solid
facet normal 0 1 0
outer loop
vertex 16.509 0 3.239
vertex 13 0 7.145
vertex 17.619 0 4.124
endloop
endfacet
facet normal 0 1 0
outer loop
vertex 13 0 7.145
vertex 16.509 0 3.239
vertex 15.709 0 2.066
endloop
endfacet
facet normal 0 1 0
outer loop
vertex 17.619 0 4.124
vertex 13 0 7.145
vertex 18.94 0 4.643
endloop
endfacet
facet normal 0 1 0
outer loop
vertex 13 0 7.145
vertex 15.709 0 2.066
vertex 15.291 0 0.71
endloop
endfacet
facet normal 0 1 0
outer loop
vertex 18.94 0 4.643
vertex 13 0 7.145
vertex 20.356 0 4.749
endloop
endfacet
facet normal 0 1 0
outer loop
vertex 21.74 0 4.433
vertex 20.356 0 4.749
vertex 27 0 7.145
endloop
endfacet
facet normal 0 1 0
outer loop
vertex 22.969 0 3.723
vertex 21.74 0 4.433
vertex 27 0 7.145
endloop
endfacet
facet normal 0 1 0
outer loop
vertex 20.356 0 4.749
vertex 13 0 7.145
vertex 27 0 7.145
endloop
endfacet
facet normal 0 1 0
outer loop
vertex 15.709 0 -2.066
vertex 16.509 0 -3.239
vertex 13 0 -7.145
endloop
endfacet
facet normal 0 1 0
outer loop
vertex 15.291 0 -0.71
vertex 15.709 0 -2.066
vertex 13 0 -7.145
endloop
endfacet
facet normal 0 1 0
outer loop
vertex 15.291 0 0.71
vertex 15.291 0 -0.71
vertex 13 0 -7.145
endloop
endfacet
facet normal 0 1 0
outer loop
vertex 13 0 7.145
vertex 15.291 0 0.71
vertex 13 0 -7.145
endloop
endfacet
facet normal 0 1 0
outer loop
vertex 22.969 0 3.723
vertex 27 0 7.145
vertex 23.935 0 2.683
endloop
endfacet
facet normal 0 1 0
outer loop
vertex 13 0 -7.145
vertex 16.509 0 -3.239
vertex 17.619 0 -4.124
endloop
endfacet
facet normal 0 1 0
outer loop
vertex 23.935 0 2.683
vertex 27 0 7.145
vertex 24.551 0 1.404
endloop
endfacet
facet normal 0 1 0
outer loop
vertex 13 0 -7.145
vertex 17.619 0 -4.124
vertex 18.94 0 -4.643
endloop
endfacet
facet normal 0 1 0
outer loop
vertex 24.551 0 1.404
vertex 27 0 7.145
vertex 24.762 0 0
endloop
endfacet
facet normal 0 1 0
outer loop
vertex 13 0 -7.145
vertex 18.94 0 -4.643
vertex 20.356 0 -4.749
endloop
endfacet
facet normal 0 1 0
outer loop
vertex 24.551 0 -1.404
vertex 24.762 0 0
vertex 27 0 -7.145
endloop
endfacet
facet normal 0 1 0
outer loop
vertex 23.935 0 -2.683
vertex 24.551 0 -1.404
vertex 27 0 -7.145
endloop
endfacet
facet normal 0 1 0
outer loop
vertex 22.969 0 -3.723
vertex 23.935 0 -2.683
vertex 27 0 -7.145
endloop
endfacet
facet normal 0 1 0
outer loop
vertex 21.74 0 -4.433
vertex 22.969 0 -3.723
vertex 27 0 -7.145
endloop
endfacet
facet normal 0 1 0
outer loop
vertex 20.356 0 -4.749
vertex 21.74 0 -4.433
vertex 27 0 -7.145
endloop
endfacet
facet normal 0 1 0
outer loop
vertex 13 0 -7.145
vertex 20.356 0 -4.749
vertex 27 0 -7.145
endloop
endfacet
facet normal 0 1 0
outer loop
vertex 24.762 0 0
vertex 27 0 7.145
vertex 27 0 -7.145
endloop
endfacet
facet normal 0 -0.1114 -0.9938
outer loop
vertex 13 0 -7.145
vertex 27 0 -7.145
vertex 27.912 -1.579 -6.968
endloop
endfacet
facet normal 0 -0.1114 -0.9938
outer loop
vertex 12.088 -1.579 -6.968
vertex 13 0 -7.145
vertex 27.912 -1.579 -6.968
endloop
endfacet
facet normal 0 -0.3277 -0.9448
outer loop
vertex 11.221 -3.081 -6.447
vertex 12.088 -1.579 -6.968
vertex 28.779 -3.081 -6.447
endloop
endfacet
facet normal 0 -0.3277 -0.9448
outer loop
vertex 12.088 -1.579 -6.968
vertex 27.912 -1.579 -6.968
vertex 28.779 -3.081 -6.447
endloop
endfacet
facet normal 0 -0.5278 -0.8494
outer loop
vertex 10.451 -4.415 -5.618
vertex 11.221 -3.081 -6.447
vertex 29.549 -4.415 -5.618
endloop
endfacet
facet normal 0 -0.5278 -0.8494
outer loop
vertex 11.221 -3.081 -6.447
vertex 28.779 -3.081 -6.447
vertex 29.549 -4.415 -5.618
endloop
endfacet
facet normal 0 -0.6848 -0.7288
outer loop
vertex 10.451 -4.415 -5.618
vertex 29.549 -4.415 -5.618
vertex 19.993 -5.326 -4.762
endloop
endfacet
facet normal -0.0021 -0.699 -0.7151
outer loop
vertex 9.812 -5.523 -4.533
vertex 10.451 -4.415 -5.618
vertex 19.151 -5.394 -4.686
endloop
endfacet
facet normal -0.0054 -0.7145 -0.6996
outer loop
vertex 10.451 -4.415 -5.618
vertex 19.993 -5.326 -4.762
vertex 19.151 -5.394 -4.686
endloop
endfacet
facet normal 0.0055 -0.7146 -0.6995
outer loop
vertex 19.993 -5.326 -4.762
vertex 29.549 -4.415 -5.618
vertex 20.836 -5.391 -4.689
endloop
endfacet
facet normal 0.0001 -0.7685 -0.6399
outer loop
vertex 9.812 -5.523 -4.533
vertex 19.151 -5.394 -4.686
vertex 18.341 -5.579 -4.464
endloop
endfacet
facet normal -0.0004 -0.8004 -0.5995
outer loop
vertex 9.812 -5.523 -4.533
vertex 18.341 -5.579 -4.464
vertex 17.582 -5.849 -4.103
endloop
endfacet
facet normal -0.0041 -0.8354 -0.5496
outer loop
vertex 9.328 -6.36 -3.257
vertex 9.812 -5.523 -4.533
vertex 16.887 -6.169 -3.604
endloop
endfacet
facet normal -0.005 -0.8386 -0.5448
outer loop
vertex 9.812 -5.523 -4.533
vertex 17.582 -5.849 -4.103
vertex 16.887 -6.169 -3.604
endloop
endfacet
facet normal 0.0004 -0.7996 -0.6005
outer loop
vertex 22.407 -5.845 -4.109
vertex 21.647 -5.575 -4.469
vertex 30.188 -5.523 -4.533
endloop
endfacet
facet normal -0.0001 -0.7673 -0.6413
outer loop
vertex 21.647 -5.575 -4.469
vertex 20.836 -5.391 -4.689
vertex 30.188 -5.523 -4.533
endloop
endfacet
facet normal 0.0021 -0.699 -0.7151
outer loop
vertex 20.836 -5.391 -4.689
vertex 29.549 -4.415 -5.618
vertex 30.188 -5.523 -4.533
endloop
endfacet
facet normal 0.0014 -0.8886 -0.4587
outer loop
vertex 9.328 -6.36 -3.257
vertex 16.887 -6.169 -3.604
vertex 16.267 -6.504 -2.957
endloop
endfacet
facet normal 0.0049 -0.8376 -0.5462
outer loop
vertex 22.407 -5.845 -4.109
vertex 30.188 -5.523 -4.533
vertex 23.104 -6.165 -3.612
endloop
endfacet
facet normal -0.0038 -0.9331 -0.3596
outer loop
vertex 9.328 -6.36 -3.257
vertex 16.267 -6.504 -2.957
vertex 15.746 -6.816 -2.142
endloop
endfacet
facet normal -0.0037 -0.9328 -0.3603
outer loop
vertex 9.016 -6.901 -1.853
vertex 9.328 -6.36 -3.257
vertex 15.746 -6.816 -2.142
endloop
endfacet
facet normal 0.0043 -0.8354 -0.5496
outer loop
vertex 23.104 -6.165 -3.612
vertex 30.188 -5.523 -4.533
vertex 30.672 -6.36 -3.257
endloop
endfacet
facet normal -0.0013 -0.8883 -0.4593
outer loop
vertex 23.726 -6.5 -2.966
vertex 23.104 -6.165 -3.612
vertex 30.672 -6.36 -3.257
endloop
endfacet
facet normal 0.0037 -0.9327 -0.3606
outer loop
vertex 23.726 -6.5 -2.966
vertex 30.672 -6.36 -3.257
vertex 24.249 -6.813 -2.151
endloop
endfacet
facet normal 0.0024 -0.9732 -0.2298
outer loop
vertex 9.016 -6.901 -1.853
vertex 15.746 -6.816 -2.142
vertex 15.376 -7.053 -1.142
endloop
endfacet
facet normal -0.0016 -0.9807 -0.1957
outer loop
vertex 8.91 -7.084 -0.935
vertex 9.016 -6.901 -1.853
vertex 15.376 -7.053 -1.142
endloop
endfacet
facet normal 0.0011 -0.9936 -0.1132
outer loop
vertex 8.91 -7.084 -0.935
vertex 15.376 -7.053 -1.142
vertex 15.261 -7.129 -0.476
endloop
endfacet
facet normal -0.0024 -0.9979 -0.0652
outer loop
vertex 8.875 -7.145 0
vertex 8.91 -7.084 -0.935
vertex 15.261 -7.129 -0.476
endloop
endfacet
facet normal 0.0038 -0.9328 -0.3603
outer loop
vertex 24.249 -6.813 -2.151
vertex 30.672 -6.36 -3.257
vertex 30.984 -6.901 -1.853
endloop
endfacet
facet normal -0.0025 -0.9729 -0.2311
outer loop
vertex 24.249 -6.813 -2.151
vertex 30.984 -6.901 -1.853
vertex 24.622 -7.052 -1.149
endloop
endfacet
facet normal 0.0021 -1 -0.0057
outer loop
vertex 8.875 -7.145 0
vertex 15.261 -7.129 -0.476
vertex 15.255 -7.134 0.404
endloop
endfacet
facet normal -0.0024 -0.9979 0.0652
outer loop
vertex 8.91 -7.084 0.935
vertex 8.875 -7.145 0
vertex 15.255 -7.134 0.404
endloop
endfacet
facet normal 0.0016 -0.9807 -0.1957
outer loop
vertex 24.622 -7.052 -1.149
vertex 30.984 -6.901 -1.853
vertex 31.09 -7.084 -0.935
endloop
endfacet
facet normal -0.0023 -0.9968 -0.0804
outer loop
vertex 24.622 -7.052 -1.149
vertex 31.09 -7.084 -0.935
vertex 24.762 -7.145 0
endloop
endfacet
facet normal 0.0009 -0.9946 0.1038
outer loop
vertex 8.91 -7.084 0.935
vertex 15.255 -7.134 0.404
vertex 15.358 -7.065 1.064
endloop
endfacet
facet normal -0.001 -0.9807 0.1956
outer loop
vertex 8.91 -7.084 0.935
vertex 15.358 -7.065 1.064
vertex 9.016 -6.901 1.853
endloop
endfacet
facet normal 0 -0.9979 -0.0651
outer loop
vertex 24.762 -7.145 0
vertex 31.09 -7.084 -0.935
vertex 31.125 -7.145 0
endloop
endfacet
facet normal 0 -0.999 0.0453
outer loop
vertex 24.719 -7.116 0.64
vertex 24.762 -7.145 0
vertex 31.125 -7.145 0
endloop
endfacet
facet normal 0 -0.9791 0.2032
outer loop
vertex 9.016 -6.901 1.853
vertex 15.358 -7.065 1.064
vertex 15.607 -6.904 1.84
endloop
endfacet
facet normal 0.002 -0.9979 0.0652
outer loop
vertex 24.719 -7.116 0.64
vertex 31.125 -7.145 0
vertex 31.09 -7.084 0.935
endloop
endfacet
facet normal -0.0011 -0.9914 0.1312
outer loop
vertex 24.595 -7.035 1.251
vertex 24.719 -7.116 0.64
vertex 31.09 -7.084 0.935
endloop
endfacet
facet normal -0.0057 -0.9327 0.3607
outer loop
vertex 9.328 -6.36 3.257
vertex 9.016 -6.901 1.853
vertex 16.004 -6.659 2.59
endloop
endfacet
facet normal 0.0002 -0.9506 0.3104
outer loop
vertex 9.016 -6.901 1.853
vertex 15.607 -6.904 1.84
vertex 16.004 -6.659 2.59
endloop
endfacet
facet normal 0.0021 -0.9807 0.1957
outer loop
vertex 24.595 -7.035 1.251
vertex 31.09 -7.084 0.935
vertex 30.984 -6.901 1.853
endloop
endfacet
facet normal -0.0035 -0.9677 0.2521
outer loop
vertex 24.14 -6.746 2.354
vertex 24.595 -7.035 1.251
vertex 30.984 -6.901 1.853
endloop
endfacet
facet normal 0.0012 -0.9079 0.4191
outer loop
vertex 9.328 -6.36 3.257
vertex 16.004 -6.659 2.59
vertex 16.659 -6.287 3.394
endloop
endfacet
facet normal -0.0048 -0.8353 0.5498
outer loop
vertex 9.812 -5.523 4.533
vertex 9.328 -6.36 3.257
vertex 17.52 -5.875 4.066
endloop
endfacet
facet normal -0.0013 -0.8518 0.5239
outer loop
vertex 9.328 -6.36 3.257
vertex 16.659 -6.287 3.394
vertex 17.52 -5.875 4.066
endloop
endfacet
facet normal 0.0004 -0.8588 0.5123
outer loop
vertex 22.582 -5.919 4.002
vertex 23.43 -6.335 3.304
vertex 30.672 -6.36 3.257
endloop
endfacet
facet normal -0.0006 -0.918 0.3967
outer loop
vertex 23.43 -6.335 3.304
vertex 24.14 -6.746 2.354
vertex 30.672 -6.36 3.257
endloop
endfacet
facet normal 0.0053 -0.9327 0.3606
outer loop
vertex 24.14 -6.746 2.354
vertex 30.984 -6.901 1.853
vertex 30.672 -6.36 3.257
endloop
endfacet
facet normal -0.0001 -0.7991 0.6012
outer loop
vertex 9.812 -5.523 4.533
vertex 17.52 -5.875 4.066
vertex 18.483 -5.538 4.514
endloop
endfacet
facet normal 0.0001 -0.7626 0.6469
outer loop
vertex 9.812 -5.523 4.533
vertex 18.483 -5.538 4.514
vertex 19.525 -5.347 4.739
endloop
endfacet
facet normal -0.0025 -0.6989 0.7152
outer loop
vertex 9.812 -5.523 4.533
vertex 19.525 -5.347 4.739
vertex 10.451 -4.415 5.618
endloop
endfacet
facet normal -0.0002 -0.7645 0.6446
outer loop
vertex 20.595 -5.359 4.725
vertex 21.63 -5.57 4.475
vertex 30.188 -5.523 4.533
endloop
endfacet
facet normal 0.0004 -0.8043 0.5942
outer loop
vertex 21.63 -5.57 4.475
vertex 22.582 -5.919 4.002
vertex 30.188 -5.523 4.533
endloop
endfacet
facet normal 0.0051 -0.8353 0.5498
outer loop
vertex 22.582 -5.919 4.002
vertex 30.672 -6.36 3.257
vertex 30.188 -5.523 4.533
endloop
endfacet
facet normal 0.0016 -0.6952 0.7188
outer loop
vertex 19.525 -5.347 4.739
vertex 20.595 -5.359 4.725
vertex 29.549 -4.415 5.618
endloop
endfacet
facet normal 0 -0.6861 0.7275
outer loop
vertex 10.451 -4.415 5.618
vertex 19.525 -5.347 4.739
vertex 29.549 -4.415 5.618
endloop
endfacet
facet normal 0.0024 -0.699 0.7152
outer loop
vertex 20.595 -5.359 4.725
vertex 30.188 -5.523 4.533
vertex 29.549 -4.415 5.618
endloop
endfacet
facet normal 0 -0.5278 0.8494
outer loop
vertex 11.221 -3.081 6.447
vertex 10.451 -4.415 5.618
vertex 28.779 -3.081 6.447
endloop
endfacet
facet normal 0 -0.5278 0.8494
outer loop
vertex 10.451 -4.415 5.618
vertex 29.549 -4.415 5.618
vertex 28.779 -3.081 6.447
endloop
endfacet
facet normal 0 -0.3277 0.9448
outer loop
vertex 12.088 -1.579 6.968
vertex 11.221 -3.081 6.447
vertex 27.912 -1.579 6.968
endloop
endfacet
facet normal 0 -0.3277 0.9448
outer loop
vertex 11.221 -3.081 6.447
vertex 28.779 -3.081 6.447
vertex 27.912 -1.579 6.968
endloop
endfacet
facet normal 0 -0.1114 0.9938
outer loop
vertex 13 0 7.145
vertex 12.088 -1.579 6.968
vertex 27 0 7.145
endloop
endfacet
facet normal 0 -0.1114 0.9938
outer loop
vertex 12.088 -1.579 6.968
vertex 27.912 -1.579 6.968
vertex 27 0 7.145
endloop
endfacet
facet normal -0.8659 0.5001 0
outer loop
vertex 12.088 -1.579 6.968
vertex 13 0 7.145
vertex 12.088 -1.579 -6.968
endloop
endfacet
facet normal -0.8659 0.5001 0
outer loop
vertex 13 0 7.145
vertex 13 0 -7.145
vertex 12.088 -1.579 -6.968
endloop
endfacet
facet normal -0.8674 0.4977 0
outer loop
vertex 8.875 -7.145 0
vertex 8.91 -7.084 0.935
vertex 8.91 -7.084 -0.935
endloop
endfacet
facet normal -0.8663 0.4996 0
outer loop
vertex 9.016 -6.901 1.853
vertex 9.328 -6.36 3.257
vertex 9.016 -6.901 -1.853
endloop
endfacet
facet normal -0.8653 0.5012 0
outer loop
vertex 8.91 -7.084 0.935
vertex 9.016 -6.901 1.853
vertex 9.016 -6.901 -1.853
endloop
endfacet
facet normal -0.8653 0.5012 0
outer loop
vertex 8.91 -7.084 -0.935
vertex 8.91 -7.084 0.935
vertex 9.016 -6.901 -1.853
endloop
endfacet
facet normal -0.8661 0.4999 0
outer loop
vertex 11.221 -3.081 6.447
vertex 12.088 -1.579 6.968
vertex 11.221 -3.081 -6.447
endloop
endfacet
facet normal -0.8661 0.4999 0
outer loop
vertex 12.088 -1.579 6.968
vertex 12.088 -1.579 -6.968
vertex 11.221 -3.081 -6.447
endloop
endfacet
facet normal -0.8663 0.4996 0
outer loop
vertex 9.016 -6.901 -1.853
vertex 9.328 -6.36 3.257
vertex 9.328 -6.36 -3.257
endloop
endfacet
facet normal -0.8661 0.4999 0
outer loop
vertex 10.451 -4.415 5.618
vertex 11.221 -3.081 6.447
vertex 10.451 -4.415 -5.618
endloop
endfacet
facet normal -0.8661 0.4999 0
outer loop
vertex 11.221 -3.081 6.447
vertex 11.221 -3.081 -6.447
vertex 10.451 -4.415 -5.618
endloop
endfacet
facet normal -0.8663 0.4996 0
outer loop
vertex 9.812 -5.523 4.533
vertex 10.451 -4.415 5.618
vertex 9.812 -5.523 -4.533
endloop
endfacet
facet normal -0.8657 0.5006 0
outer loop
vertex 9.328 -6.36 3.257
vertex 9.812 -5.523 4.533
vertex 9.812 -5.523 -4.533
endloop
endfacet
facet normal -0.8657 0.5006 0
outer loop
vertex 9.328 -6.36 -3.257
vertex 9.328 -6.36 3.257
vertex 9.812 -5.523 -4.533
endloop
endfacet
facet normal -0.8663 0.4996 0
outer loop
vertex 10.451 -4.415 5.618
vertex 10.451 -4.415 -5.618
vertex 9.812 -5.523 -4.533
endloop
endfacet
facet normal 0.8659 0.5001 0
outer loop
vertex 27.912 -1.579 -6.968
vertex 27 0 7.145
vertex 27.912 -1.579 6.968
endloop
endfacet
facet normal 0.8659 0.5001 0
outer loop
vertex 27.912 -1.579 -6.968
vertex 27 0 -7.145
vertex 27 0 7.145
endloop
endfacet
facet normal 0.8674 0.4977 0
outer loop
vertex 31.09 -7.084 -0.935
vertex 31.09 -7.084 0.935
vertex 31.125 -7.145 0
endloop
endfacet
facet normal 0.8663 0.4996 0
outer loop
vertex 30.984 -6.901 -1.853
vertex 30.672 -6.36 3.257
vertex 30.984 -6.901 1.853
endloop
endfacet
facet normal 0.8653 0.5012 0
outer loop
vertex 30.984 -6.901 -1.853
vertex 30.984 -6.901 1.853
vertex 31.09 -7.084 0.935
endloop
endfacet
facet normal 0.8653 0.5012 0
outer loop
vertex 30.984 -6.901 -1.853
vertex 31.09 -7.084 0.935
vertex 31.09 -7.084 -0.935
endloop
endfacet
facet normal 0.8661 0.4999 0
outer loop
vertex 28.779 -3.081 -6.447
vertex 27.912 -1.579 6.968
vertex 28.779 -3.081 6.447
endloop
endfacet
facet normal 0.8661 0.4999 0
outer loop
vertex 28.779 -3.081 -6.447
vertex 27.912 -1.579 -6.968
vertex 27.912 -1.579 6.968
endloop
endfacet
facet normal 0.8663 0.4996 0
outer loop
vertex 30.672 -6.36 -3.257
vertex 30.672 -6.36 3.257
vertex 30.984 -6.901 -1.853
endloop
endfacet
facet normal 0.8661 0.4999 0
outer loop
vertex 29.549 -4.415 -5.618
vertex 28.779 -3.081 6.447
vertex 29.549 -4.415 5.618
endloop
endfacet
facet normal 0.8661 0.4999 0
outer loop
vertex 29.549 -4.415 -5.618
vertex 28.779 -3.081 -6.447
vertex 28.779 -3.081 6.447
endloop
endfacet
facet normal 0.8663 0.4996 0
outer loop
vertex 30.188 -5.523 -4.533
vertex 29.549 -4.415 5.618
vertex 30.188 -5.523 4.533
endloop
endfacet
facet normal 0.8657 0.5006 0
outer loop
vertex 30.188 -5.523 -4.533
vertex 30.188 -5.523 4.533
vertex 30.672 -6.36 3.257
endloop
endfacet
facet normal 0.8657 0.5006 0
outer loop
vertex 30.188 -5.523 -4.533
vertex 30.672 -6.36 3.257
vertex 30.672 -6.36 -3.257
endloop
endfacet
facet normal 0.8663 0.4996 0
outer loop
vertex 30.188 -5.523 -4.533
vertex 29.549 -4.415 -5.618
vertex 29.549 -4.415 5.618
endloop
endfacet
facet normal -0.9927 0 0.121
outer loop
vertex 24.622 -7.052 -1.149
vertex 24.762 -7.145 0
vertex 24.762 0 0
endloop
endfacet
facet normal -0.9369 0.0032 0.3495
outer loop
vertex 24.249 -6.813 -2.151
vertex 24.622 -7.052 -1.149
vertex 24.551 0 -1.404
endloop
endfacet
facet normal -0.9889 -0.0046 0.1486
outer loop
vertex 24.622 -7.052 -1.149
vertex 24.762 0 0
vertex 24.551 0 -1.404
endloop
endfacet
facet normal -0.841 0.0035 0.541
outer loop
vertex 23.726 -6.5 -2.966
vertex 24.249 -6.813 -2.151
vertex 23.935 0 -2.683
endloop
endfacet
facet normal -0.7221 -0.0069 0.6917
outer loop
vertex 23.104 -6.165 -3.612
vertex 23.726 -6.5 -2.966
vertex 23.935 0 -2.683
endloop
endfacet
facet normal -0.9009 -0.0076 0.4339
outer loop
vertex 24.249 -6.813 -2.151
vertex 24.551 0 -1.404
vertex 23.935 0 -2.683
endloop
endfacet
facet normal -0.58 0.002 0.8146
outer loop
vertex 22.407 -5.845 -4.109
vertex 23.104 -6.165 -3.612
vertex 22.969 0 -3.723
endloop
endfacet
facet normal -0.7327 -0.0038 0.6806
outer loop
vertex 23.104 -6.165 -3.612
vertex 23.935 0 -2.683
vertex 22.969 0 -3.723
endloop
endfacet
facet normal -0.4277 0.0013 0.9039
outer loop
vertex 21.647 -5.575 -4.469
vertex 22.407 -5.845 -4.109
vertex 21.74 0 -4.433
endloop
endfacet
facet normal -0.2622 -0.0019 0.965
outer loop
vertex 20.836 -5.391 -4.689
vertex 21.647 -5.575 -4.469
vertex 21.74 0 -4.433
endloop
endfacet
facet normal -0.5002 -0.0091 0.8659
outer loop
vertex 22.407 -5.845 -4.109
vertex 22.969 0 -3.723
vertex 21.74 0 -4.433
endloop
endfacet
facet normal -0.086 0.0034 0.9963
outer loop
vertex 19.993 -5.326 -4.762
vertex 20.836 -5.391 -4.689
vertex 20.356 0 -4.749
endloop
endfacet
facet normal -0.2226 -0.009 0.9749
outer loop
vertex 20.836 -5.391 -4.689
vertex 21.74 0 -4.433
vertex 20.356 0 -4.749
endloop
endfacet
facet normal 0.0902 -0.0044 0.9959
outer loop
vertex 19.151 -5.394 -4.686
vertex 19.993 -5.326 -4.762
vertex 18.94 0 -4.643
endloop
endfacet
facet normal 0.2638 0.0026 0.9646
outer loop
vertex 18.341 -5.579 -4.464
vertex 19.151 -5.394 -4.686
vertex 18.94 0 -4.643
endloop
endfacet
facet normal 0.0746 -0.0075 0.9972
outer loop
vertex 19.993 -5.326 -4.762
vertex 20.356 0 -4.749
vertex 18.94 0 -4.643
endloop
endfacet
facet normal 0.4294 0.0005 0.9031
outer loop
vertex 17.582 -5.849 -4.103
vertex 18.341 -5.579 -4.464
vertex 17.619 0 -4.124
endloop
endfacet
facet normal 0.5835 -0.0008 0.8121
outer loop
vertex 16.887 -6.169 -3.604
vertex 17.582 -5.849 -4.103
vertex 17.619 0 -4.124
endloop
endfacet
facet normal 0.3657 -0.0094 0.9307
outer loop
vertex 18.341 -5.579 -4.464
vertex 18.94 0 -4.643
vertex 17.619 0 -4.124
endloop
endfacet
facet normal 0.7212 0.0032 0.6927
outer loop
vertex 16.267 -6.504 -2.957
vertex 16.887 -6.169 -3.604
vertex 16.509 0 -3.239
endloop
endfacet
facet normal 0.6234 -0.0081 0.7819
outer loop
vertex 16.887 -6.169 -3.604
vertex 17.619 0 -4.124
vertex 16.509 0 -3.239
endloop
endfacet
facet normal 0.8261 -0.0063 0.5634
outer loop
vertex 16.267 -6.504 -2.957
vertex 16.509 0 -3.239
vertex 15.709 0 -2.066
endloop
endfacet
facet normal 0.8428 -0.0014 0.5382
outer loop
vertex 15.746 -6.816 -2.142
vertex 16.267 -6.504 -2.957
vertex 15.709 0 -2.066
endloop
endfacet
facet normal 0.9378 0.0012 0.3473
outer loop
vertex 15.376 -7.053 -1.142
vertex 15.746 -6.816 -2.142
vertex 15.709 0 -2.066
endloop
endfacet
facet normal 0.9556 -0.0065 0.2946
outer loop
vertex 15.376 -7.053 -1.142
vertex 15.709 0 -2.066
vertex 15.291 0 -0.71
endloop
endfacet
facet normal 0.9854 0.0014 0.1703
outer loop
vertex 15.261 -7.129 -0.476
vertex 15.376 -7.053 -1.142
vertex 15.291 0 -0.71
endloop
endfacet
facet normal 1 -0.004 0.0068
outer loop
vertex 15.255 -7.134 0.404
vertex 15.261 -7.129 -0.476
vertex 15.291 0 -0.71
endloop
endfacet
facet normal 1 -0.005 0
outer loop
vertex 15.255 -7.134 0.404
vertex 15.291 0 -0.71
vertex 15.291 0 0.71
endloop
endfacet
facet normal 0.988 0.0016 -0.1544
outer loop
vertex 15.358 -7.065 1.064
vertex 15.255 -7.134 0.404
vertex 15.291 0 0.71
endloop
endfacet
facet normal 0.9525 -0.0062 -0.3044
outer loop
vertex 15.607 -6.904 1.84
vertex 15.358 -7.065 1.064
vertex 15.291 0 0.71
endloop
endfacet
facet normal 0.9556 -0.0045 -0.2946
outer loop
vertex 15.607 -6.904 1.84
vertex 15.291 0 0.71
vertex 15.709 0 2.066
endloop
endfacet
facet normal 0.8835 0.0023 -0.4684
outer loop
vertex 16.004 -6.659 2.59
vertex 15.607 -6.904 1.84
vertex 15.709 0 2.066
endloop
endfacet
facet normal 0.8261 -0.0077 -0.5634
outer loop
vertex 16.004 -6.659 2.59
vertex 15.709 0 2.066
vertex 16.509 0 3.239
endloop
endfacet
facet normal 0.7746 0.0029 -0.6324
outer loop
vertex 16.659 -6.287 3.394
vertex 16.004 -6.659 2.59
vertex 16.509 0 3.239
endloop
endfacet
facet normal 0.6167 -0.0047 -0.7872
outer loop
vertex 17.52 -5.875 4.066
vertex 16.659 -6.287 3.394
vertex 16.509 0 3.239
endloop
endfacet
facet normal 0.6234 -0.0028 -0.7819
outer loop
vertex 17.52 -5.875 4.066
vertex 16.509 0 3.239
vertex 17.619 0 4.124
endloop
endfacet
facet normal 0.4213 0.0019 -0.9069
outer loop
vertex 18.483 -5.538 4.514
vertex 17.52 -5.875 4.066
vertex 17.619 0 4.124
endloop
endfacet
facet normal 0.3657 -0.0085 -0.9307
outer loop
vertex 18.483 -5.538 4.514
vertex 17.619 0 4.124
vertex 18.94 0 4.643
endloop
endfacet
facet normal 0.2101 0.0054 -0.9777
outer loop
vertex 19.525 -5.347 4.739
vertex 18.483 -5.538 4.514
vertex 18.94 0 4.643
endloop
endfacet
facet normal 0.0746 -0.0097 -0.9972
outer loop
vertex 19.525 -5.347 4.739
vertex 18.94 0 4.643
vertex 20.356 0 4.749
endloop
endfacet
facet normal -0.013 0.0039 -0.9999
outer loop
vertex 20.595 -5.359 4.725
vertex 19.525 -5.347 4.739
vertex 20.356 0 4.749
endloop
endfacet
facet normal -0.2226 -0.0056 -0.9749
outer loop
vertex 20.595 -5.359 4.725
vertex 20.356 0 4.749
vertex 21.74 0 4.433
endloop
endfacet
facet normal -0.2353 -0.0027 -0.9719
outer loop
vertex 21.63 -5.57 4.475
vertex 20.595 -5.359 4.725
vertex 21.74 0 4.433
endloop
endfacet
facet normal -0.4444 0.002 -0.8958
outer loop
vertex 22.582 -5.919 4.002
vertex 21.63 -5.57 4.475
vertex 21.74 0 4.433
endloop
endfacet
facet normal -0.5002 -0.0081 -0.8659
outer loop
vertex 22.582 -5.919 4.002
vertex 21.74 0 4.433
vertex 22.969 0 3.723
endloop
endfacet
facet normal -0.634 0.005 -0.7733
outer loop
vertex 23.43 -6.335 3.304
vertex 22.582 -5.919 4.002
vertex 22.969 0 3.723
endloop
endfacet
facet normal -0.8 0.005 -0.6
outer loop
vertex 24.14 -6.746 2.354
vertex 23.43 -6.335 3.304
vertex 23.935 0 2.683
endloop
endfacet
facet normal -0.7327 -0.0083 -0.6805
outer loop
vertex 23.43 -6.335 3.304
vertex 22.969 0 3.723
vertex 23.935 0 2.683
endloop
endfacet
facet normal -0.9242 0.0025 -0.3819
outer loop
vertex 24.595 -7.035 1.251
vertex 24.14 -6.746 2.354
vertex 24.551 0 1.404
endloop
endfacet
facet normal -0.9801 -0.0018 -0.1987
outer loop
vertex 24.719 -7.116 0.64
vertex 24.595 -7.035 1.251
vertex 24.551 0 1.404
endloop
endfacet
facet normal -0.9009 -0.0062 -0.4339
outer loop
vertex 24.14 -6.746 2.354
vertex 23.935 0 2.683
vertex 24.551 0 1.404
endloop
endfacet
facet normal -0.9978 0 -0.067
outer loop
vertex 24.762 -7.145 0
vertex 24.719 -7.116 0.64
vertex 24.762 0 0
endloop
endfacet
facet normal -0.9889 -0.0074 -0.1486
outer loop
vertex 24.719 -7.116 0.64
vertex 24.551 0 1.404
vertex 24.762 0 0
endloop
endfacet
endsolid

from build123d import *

# Parameters (mm, degrees)
BOSS_EXTRUDE3_DEPTH      = 34
BOSS_EXTRUDE3_DEPTH_BACK = 34
SKETCH1_R                = 4.7625
CUT_EXTRUDE1_DEPTH       = 36.469734281
CUT_EXTRUDE3_DEPTH       = 36.46973442
CUT_EXTRUDE3_DEPTH_BACK  = 36.46973442


with BuildPart() as part:
    # Sketch2 → Boss-Extrude3 (new, two sides: drawn at the far end of the back side and taken through both)
    with BuildSketch(Plane(origin=(0, 0, 0), x_dir=(0, 0, -1), z_dir=(1, 0, 0)).offset(-BOSS_EXTRUDE3_DEPTH_BACK)):
        with BuildLine():
            Line((-7.145, 0), (7.145, 0))
            ThreePointArc((7.145, 0), (0, -7.145), (-7.145, 0))
        make_face()
    extrude(amount=BOSS_EXTRUDE3_DEPTH + BOSS_EXTRUDE3_DEPTH_BACK)

    # Sketch1 → Cut-Extrude1 (cut, through all)
    with BuildSketch(Plane(origin=(0, 0, 0), x_dir=(1, 0, 0), z_dir=(0, 1, 0))):
        with Locations((-20, 0)):
            Circle(SKETCH1_R)
        with Locations((20, 0)):
            Circle(SKETCH1_R)
    extrude(amount=-CUT_EXTRUDE1_DEPTH, mode=Mode.SUBTRACT)

    # Sketch4 → Cut-Extrude3 (cut, two sides: drawn at the far end of the back side and taken through both)
    with BuildSketch(Plane.XY.offset(-CUT_EXTRUDE3_DEPTH_BACK)):
        Polygon((-13, 0), (13, 0), (7.803847577, -9), (-7.803847577, -9), align=None)
        Polygon((32.196152423, -9), (43.216463998, -9), (43.216463998, 0), (27, 0), align=None)
        Polygon((-43.216463998, 0), (-27, 0), (-32.196152423, -9), (-43.216463998, -9), align=None)
    extrude(amount=CUT_EXTRUDE3_DEPTH + CUT_EXTRUDE3_DEPTH_BACK, mode=Mode.SUBTRACT)


with BuildPart() as cut_extrude3_piece_1:
    # of the separate pieces the step leaves, piece 1, a body of its own (cut_extrude3_pieces)
    add(part.part.solids().sort_by_distance((-27, 0, 7.145))[0])


with BuildPart() as cut_extrude3_piece_2:
    # of the separate pieces the step leaves, piece 2, a body of its own (cut_extrude3_pieces)
    add(part.part.solids().sort_by_distance((13, 0, 7.145))[0])


solid = cut_extrude3_piece_2.part
